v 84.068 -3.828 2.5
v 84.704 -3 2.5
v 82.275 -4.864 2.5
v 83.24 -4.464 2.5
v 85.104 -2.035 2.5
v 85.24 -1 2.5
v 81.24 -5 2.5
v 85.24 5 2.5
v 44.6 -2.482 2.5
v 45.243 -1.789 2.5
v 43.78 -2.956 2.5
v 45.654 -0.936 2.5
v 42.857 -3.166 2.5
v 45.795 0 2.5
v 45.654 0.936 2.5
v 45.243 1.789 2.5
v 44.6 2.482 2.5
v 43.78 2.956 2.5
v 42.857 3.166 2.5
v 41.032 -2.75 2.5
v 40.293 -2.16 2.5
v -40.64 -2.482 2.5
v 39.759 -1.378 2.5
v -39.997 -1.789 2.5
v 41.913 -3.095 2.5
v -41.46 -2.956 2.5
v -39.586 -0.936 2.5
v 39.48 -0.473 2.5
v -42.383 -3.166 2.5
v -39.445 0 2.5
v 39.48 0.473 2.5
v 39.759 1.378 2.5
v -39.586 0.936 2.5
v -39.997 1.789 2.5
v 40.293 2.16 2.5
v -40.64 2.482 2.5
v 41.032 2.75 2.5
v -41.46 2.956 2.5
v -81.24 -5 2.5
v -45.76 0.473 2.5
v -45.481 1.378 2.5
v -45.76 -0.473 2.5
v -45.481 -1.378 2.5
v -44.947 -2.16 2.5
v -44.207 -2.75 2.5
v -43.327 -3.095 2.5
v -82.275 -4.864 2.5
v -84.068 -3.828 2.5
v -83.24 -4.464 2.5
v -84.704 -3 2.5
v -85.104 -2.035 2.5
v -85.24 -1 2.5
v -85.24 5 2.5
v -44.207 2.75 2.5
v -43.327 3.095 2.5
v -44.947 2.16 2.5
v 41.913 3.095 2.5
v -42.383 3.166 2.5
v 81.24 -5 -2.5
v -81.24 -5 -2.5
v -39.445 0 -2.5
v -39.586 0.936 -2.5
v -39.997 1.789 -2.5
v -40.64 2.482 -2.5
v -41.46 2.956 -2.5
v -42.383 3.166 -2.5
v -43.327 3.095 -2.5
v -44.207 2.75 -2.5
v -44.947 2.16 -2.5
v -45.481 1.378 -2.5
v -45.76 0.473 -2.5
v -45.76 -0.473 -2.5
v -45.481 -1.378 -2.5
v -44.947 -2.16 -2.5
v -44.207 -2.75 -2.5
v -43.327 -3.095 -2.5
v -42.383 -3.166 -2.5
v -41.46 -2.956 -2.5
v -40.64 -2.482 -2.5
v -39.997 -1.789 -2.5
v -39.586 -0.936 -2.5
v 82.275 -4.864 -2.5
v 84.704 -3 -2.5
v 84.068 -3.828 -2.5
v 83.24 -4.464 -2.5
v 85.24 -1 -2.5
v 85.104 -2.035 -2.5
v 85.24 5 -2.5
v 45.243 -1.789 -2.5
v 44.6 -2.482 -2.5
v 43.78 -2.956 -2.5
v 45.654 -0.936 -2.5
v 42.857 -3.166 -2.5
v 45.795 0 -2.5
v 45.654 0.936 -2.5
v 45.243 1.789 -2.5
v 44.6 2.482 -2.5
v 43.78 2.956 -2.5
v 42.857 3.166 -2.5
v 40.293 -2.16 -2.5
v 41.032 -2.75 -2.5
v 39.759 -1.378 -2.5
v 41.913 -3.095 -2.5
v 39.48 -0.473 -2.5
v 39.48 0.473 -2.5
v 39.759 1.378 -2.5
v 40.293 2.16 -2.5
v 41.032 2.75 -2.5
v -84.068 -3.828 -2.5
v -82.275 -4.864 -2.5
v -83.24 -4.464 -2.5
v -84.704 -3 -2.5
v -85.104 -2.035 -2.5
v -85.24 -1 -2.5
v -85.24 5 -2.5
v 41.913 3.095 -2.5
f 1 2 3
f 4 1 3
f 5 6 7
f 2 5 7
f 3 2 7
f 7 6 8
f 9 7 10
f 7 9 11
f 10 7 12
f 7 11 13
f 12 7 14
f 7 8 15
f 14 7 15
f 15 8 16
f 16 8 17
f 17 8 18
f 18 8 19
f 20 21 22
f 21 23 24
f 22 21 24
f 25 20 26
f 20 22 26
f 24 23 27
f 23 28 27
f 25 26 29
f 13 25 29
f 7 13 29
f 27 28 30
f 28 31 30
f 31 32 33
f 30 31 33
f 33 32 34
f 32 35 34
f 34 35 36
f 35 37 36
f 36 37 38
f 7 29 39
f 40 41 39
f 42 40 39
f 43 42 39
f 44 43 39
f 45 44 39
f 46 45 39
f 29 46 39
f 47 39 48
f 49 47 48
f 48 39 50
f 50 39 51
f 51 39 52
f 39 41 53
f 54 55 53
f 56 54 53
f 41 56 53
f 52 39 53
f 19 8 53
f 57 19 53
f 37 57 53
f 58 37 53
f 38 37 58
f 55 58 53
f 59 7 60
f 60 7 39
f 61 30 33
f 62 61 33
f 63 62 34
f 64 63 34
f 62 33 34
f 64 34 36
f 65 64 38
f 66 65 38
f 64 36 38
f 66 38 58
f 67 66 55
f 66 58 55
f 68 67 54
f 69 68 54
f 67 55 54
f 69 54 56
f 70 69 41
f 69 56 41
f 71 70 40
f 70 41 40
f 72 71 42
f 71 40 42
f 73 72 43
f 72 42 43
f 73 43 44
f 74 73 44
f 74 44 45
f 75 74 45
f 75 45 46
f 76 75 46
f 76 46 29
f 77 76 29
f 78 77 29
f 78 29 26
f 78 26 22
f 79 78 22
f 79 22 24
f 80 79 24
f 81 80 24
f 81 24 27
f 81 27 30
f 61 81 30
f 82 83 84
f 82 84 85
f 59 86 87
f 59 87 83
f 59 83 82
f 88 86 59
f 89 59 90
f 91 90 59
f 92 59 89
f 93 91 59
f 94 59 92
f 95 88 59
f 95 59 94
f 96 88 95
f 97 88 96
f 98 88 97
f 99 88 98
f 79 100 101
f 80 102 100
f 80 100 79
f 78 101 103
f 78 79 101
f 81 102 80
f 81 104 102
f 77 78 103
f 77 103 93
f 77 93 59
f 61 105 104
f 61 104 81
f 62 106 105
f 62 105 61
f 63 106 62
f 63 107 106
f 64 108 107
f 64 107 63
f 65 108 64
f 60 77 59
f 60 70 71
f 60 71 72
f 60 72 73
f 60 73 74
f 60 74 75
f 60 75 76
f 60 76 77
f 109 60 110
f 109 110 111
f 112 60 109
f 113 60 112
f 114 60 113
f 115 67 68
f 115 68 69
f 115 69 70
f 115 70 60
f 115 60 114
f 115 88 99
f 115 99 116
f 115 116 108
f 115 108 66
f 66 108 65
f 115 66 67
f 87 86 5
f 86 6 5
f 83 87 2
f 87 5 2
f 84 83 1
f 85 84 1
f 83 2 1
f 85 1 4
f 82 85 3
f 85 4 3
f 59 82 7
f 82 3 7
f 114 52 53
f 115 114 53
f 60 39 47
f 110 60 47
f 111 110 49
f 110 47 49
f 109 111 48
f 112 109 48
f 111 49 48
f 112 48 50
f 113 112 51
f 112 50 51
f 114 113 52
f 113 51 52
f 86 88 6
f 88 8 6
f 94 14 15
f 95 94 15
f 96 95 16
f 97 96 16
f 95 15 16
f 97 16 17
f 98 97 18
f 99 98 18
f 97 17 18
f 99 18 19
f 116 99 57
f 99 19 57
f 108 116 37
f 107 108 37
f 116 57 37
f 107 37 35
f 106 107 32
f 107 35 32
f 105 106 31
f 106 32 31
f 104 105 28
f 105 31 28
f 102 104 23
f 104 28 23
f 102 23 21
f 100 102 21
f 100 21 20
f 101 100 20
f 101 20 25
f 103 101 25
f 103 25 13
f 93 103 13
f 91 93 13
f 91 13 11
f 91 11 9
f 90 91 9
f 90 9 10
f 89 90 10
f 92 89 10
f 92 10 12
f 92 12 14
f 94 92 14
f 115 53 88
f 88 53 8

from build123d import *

# Parameters (mm, degrees)
SALIENTE_EXTRUIR1_DEPTH = 2.5
CROQUIS2_R              = 3.175
CORTAR_EXTRUIR1_DEPTH   = 86.532786696


with BuildPart() as part:
    # Croquis1 → Saliente-Extruir1 (new, symmetric)
    with BuildSketch(Plane.XY):
        with BuildLine():
            Line((-85.24, 5), (85.24, 5))
            Line((85.24, 5), (85.24, -1))
            ThreePointArc((85.24, -1), (84.068427125, -3.828427125), (81.24, -5))
            Line((81.24, -5), (-81.24, -5))
            ThreePointArc((-81.24, -5), (-84.068427125, -3.828427125), (-85.24, -1))
            Line((-85.24, -1), (-85.24, 5))
        make_face()
    extrude(amount=SALIENTE_EXTRUIR1_DEPTH, both=True)

    # Croquis2 → Cortar-Extruir1 (cut, through all)
    with BuildSketch(Plane.XY.offset(2.5)):
        with Locations((42.62, 0)):
            Circle(CROQUIS2_R)
        with Locations((-42.62, 0)):
            Circle(CROQUIS2_R)
    extrude(amount=-CORTAR_EXTRUIR1_DEPTH, mode=Mode.SUBTRACT)


solid = part.part
